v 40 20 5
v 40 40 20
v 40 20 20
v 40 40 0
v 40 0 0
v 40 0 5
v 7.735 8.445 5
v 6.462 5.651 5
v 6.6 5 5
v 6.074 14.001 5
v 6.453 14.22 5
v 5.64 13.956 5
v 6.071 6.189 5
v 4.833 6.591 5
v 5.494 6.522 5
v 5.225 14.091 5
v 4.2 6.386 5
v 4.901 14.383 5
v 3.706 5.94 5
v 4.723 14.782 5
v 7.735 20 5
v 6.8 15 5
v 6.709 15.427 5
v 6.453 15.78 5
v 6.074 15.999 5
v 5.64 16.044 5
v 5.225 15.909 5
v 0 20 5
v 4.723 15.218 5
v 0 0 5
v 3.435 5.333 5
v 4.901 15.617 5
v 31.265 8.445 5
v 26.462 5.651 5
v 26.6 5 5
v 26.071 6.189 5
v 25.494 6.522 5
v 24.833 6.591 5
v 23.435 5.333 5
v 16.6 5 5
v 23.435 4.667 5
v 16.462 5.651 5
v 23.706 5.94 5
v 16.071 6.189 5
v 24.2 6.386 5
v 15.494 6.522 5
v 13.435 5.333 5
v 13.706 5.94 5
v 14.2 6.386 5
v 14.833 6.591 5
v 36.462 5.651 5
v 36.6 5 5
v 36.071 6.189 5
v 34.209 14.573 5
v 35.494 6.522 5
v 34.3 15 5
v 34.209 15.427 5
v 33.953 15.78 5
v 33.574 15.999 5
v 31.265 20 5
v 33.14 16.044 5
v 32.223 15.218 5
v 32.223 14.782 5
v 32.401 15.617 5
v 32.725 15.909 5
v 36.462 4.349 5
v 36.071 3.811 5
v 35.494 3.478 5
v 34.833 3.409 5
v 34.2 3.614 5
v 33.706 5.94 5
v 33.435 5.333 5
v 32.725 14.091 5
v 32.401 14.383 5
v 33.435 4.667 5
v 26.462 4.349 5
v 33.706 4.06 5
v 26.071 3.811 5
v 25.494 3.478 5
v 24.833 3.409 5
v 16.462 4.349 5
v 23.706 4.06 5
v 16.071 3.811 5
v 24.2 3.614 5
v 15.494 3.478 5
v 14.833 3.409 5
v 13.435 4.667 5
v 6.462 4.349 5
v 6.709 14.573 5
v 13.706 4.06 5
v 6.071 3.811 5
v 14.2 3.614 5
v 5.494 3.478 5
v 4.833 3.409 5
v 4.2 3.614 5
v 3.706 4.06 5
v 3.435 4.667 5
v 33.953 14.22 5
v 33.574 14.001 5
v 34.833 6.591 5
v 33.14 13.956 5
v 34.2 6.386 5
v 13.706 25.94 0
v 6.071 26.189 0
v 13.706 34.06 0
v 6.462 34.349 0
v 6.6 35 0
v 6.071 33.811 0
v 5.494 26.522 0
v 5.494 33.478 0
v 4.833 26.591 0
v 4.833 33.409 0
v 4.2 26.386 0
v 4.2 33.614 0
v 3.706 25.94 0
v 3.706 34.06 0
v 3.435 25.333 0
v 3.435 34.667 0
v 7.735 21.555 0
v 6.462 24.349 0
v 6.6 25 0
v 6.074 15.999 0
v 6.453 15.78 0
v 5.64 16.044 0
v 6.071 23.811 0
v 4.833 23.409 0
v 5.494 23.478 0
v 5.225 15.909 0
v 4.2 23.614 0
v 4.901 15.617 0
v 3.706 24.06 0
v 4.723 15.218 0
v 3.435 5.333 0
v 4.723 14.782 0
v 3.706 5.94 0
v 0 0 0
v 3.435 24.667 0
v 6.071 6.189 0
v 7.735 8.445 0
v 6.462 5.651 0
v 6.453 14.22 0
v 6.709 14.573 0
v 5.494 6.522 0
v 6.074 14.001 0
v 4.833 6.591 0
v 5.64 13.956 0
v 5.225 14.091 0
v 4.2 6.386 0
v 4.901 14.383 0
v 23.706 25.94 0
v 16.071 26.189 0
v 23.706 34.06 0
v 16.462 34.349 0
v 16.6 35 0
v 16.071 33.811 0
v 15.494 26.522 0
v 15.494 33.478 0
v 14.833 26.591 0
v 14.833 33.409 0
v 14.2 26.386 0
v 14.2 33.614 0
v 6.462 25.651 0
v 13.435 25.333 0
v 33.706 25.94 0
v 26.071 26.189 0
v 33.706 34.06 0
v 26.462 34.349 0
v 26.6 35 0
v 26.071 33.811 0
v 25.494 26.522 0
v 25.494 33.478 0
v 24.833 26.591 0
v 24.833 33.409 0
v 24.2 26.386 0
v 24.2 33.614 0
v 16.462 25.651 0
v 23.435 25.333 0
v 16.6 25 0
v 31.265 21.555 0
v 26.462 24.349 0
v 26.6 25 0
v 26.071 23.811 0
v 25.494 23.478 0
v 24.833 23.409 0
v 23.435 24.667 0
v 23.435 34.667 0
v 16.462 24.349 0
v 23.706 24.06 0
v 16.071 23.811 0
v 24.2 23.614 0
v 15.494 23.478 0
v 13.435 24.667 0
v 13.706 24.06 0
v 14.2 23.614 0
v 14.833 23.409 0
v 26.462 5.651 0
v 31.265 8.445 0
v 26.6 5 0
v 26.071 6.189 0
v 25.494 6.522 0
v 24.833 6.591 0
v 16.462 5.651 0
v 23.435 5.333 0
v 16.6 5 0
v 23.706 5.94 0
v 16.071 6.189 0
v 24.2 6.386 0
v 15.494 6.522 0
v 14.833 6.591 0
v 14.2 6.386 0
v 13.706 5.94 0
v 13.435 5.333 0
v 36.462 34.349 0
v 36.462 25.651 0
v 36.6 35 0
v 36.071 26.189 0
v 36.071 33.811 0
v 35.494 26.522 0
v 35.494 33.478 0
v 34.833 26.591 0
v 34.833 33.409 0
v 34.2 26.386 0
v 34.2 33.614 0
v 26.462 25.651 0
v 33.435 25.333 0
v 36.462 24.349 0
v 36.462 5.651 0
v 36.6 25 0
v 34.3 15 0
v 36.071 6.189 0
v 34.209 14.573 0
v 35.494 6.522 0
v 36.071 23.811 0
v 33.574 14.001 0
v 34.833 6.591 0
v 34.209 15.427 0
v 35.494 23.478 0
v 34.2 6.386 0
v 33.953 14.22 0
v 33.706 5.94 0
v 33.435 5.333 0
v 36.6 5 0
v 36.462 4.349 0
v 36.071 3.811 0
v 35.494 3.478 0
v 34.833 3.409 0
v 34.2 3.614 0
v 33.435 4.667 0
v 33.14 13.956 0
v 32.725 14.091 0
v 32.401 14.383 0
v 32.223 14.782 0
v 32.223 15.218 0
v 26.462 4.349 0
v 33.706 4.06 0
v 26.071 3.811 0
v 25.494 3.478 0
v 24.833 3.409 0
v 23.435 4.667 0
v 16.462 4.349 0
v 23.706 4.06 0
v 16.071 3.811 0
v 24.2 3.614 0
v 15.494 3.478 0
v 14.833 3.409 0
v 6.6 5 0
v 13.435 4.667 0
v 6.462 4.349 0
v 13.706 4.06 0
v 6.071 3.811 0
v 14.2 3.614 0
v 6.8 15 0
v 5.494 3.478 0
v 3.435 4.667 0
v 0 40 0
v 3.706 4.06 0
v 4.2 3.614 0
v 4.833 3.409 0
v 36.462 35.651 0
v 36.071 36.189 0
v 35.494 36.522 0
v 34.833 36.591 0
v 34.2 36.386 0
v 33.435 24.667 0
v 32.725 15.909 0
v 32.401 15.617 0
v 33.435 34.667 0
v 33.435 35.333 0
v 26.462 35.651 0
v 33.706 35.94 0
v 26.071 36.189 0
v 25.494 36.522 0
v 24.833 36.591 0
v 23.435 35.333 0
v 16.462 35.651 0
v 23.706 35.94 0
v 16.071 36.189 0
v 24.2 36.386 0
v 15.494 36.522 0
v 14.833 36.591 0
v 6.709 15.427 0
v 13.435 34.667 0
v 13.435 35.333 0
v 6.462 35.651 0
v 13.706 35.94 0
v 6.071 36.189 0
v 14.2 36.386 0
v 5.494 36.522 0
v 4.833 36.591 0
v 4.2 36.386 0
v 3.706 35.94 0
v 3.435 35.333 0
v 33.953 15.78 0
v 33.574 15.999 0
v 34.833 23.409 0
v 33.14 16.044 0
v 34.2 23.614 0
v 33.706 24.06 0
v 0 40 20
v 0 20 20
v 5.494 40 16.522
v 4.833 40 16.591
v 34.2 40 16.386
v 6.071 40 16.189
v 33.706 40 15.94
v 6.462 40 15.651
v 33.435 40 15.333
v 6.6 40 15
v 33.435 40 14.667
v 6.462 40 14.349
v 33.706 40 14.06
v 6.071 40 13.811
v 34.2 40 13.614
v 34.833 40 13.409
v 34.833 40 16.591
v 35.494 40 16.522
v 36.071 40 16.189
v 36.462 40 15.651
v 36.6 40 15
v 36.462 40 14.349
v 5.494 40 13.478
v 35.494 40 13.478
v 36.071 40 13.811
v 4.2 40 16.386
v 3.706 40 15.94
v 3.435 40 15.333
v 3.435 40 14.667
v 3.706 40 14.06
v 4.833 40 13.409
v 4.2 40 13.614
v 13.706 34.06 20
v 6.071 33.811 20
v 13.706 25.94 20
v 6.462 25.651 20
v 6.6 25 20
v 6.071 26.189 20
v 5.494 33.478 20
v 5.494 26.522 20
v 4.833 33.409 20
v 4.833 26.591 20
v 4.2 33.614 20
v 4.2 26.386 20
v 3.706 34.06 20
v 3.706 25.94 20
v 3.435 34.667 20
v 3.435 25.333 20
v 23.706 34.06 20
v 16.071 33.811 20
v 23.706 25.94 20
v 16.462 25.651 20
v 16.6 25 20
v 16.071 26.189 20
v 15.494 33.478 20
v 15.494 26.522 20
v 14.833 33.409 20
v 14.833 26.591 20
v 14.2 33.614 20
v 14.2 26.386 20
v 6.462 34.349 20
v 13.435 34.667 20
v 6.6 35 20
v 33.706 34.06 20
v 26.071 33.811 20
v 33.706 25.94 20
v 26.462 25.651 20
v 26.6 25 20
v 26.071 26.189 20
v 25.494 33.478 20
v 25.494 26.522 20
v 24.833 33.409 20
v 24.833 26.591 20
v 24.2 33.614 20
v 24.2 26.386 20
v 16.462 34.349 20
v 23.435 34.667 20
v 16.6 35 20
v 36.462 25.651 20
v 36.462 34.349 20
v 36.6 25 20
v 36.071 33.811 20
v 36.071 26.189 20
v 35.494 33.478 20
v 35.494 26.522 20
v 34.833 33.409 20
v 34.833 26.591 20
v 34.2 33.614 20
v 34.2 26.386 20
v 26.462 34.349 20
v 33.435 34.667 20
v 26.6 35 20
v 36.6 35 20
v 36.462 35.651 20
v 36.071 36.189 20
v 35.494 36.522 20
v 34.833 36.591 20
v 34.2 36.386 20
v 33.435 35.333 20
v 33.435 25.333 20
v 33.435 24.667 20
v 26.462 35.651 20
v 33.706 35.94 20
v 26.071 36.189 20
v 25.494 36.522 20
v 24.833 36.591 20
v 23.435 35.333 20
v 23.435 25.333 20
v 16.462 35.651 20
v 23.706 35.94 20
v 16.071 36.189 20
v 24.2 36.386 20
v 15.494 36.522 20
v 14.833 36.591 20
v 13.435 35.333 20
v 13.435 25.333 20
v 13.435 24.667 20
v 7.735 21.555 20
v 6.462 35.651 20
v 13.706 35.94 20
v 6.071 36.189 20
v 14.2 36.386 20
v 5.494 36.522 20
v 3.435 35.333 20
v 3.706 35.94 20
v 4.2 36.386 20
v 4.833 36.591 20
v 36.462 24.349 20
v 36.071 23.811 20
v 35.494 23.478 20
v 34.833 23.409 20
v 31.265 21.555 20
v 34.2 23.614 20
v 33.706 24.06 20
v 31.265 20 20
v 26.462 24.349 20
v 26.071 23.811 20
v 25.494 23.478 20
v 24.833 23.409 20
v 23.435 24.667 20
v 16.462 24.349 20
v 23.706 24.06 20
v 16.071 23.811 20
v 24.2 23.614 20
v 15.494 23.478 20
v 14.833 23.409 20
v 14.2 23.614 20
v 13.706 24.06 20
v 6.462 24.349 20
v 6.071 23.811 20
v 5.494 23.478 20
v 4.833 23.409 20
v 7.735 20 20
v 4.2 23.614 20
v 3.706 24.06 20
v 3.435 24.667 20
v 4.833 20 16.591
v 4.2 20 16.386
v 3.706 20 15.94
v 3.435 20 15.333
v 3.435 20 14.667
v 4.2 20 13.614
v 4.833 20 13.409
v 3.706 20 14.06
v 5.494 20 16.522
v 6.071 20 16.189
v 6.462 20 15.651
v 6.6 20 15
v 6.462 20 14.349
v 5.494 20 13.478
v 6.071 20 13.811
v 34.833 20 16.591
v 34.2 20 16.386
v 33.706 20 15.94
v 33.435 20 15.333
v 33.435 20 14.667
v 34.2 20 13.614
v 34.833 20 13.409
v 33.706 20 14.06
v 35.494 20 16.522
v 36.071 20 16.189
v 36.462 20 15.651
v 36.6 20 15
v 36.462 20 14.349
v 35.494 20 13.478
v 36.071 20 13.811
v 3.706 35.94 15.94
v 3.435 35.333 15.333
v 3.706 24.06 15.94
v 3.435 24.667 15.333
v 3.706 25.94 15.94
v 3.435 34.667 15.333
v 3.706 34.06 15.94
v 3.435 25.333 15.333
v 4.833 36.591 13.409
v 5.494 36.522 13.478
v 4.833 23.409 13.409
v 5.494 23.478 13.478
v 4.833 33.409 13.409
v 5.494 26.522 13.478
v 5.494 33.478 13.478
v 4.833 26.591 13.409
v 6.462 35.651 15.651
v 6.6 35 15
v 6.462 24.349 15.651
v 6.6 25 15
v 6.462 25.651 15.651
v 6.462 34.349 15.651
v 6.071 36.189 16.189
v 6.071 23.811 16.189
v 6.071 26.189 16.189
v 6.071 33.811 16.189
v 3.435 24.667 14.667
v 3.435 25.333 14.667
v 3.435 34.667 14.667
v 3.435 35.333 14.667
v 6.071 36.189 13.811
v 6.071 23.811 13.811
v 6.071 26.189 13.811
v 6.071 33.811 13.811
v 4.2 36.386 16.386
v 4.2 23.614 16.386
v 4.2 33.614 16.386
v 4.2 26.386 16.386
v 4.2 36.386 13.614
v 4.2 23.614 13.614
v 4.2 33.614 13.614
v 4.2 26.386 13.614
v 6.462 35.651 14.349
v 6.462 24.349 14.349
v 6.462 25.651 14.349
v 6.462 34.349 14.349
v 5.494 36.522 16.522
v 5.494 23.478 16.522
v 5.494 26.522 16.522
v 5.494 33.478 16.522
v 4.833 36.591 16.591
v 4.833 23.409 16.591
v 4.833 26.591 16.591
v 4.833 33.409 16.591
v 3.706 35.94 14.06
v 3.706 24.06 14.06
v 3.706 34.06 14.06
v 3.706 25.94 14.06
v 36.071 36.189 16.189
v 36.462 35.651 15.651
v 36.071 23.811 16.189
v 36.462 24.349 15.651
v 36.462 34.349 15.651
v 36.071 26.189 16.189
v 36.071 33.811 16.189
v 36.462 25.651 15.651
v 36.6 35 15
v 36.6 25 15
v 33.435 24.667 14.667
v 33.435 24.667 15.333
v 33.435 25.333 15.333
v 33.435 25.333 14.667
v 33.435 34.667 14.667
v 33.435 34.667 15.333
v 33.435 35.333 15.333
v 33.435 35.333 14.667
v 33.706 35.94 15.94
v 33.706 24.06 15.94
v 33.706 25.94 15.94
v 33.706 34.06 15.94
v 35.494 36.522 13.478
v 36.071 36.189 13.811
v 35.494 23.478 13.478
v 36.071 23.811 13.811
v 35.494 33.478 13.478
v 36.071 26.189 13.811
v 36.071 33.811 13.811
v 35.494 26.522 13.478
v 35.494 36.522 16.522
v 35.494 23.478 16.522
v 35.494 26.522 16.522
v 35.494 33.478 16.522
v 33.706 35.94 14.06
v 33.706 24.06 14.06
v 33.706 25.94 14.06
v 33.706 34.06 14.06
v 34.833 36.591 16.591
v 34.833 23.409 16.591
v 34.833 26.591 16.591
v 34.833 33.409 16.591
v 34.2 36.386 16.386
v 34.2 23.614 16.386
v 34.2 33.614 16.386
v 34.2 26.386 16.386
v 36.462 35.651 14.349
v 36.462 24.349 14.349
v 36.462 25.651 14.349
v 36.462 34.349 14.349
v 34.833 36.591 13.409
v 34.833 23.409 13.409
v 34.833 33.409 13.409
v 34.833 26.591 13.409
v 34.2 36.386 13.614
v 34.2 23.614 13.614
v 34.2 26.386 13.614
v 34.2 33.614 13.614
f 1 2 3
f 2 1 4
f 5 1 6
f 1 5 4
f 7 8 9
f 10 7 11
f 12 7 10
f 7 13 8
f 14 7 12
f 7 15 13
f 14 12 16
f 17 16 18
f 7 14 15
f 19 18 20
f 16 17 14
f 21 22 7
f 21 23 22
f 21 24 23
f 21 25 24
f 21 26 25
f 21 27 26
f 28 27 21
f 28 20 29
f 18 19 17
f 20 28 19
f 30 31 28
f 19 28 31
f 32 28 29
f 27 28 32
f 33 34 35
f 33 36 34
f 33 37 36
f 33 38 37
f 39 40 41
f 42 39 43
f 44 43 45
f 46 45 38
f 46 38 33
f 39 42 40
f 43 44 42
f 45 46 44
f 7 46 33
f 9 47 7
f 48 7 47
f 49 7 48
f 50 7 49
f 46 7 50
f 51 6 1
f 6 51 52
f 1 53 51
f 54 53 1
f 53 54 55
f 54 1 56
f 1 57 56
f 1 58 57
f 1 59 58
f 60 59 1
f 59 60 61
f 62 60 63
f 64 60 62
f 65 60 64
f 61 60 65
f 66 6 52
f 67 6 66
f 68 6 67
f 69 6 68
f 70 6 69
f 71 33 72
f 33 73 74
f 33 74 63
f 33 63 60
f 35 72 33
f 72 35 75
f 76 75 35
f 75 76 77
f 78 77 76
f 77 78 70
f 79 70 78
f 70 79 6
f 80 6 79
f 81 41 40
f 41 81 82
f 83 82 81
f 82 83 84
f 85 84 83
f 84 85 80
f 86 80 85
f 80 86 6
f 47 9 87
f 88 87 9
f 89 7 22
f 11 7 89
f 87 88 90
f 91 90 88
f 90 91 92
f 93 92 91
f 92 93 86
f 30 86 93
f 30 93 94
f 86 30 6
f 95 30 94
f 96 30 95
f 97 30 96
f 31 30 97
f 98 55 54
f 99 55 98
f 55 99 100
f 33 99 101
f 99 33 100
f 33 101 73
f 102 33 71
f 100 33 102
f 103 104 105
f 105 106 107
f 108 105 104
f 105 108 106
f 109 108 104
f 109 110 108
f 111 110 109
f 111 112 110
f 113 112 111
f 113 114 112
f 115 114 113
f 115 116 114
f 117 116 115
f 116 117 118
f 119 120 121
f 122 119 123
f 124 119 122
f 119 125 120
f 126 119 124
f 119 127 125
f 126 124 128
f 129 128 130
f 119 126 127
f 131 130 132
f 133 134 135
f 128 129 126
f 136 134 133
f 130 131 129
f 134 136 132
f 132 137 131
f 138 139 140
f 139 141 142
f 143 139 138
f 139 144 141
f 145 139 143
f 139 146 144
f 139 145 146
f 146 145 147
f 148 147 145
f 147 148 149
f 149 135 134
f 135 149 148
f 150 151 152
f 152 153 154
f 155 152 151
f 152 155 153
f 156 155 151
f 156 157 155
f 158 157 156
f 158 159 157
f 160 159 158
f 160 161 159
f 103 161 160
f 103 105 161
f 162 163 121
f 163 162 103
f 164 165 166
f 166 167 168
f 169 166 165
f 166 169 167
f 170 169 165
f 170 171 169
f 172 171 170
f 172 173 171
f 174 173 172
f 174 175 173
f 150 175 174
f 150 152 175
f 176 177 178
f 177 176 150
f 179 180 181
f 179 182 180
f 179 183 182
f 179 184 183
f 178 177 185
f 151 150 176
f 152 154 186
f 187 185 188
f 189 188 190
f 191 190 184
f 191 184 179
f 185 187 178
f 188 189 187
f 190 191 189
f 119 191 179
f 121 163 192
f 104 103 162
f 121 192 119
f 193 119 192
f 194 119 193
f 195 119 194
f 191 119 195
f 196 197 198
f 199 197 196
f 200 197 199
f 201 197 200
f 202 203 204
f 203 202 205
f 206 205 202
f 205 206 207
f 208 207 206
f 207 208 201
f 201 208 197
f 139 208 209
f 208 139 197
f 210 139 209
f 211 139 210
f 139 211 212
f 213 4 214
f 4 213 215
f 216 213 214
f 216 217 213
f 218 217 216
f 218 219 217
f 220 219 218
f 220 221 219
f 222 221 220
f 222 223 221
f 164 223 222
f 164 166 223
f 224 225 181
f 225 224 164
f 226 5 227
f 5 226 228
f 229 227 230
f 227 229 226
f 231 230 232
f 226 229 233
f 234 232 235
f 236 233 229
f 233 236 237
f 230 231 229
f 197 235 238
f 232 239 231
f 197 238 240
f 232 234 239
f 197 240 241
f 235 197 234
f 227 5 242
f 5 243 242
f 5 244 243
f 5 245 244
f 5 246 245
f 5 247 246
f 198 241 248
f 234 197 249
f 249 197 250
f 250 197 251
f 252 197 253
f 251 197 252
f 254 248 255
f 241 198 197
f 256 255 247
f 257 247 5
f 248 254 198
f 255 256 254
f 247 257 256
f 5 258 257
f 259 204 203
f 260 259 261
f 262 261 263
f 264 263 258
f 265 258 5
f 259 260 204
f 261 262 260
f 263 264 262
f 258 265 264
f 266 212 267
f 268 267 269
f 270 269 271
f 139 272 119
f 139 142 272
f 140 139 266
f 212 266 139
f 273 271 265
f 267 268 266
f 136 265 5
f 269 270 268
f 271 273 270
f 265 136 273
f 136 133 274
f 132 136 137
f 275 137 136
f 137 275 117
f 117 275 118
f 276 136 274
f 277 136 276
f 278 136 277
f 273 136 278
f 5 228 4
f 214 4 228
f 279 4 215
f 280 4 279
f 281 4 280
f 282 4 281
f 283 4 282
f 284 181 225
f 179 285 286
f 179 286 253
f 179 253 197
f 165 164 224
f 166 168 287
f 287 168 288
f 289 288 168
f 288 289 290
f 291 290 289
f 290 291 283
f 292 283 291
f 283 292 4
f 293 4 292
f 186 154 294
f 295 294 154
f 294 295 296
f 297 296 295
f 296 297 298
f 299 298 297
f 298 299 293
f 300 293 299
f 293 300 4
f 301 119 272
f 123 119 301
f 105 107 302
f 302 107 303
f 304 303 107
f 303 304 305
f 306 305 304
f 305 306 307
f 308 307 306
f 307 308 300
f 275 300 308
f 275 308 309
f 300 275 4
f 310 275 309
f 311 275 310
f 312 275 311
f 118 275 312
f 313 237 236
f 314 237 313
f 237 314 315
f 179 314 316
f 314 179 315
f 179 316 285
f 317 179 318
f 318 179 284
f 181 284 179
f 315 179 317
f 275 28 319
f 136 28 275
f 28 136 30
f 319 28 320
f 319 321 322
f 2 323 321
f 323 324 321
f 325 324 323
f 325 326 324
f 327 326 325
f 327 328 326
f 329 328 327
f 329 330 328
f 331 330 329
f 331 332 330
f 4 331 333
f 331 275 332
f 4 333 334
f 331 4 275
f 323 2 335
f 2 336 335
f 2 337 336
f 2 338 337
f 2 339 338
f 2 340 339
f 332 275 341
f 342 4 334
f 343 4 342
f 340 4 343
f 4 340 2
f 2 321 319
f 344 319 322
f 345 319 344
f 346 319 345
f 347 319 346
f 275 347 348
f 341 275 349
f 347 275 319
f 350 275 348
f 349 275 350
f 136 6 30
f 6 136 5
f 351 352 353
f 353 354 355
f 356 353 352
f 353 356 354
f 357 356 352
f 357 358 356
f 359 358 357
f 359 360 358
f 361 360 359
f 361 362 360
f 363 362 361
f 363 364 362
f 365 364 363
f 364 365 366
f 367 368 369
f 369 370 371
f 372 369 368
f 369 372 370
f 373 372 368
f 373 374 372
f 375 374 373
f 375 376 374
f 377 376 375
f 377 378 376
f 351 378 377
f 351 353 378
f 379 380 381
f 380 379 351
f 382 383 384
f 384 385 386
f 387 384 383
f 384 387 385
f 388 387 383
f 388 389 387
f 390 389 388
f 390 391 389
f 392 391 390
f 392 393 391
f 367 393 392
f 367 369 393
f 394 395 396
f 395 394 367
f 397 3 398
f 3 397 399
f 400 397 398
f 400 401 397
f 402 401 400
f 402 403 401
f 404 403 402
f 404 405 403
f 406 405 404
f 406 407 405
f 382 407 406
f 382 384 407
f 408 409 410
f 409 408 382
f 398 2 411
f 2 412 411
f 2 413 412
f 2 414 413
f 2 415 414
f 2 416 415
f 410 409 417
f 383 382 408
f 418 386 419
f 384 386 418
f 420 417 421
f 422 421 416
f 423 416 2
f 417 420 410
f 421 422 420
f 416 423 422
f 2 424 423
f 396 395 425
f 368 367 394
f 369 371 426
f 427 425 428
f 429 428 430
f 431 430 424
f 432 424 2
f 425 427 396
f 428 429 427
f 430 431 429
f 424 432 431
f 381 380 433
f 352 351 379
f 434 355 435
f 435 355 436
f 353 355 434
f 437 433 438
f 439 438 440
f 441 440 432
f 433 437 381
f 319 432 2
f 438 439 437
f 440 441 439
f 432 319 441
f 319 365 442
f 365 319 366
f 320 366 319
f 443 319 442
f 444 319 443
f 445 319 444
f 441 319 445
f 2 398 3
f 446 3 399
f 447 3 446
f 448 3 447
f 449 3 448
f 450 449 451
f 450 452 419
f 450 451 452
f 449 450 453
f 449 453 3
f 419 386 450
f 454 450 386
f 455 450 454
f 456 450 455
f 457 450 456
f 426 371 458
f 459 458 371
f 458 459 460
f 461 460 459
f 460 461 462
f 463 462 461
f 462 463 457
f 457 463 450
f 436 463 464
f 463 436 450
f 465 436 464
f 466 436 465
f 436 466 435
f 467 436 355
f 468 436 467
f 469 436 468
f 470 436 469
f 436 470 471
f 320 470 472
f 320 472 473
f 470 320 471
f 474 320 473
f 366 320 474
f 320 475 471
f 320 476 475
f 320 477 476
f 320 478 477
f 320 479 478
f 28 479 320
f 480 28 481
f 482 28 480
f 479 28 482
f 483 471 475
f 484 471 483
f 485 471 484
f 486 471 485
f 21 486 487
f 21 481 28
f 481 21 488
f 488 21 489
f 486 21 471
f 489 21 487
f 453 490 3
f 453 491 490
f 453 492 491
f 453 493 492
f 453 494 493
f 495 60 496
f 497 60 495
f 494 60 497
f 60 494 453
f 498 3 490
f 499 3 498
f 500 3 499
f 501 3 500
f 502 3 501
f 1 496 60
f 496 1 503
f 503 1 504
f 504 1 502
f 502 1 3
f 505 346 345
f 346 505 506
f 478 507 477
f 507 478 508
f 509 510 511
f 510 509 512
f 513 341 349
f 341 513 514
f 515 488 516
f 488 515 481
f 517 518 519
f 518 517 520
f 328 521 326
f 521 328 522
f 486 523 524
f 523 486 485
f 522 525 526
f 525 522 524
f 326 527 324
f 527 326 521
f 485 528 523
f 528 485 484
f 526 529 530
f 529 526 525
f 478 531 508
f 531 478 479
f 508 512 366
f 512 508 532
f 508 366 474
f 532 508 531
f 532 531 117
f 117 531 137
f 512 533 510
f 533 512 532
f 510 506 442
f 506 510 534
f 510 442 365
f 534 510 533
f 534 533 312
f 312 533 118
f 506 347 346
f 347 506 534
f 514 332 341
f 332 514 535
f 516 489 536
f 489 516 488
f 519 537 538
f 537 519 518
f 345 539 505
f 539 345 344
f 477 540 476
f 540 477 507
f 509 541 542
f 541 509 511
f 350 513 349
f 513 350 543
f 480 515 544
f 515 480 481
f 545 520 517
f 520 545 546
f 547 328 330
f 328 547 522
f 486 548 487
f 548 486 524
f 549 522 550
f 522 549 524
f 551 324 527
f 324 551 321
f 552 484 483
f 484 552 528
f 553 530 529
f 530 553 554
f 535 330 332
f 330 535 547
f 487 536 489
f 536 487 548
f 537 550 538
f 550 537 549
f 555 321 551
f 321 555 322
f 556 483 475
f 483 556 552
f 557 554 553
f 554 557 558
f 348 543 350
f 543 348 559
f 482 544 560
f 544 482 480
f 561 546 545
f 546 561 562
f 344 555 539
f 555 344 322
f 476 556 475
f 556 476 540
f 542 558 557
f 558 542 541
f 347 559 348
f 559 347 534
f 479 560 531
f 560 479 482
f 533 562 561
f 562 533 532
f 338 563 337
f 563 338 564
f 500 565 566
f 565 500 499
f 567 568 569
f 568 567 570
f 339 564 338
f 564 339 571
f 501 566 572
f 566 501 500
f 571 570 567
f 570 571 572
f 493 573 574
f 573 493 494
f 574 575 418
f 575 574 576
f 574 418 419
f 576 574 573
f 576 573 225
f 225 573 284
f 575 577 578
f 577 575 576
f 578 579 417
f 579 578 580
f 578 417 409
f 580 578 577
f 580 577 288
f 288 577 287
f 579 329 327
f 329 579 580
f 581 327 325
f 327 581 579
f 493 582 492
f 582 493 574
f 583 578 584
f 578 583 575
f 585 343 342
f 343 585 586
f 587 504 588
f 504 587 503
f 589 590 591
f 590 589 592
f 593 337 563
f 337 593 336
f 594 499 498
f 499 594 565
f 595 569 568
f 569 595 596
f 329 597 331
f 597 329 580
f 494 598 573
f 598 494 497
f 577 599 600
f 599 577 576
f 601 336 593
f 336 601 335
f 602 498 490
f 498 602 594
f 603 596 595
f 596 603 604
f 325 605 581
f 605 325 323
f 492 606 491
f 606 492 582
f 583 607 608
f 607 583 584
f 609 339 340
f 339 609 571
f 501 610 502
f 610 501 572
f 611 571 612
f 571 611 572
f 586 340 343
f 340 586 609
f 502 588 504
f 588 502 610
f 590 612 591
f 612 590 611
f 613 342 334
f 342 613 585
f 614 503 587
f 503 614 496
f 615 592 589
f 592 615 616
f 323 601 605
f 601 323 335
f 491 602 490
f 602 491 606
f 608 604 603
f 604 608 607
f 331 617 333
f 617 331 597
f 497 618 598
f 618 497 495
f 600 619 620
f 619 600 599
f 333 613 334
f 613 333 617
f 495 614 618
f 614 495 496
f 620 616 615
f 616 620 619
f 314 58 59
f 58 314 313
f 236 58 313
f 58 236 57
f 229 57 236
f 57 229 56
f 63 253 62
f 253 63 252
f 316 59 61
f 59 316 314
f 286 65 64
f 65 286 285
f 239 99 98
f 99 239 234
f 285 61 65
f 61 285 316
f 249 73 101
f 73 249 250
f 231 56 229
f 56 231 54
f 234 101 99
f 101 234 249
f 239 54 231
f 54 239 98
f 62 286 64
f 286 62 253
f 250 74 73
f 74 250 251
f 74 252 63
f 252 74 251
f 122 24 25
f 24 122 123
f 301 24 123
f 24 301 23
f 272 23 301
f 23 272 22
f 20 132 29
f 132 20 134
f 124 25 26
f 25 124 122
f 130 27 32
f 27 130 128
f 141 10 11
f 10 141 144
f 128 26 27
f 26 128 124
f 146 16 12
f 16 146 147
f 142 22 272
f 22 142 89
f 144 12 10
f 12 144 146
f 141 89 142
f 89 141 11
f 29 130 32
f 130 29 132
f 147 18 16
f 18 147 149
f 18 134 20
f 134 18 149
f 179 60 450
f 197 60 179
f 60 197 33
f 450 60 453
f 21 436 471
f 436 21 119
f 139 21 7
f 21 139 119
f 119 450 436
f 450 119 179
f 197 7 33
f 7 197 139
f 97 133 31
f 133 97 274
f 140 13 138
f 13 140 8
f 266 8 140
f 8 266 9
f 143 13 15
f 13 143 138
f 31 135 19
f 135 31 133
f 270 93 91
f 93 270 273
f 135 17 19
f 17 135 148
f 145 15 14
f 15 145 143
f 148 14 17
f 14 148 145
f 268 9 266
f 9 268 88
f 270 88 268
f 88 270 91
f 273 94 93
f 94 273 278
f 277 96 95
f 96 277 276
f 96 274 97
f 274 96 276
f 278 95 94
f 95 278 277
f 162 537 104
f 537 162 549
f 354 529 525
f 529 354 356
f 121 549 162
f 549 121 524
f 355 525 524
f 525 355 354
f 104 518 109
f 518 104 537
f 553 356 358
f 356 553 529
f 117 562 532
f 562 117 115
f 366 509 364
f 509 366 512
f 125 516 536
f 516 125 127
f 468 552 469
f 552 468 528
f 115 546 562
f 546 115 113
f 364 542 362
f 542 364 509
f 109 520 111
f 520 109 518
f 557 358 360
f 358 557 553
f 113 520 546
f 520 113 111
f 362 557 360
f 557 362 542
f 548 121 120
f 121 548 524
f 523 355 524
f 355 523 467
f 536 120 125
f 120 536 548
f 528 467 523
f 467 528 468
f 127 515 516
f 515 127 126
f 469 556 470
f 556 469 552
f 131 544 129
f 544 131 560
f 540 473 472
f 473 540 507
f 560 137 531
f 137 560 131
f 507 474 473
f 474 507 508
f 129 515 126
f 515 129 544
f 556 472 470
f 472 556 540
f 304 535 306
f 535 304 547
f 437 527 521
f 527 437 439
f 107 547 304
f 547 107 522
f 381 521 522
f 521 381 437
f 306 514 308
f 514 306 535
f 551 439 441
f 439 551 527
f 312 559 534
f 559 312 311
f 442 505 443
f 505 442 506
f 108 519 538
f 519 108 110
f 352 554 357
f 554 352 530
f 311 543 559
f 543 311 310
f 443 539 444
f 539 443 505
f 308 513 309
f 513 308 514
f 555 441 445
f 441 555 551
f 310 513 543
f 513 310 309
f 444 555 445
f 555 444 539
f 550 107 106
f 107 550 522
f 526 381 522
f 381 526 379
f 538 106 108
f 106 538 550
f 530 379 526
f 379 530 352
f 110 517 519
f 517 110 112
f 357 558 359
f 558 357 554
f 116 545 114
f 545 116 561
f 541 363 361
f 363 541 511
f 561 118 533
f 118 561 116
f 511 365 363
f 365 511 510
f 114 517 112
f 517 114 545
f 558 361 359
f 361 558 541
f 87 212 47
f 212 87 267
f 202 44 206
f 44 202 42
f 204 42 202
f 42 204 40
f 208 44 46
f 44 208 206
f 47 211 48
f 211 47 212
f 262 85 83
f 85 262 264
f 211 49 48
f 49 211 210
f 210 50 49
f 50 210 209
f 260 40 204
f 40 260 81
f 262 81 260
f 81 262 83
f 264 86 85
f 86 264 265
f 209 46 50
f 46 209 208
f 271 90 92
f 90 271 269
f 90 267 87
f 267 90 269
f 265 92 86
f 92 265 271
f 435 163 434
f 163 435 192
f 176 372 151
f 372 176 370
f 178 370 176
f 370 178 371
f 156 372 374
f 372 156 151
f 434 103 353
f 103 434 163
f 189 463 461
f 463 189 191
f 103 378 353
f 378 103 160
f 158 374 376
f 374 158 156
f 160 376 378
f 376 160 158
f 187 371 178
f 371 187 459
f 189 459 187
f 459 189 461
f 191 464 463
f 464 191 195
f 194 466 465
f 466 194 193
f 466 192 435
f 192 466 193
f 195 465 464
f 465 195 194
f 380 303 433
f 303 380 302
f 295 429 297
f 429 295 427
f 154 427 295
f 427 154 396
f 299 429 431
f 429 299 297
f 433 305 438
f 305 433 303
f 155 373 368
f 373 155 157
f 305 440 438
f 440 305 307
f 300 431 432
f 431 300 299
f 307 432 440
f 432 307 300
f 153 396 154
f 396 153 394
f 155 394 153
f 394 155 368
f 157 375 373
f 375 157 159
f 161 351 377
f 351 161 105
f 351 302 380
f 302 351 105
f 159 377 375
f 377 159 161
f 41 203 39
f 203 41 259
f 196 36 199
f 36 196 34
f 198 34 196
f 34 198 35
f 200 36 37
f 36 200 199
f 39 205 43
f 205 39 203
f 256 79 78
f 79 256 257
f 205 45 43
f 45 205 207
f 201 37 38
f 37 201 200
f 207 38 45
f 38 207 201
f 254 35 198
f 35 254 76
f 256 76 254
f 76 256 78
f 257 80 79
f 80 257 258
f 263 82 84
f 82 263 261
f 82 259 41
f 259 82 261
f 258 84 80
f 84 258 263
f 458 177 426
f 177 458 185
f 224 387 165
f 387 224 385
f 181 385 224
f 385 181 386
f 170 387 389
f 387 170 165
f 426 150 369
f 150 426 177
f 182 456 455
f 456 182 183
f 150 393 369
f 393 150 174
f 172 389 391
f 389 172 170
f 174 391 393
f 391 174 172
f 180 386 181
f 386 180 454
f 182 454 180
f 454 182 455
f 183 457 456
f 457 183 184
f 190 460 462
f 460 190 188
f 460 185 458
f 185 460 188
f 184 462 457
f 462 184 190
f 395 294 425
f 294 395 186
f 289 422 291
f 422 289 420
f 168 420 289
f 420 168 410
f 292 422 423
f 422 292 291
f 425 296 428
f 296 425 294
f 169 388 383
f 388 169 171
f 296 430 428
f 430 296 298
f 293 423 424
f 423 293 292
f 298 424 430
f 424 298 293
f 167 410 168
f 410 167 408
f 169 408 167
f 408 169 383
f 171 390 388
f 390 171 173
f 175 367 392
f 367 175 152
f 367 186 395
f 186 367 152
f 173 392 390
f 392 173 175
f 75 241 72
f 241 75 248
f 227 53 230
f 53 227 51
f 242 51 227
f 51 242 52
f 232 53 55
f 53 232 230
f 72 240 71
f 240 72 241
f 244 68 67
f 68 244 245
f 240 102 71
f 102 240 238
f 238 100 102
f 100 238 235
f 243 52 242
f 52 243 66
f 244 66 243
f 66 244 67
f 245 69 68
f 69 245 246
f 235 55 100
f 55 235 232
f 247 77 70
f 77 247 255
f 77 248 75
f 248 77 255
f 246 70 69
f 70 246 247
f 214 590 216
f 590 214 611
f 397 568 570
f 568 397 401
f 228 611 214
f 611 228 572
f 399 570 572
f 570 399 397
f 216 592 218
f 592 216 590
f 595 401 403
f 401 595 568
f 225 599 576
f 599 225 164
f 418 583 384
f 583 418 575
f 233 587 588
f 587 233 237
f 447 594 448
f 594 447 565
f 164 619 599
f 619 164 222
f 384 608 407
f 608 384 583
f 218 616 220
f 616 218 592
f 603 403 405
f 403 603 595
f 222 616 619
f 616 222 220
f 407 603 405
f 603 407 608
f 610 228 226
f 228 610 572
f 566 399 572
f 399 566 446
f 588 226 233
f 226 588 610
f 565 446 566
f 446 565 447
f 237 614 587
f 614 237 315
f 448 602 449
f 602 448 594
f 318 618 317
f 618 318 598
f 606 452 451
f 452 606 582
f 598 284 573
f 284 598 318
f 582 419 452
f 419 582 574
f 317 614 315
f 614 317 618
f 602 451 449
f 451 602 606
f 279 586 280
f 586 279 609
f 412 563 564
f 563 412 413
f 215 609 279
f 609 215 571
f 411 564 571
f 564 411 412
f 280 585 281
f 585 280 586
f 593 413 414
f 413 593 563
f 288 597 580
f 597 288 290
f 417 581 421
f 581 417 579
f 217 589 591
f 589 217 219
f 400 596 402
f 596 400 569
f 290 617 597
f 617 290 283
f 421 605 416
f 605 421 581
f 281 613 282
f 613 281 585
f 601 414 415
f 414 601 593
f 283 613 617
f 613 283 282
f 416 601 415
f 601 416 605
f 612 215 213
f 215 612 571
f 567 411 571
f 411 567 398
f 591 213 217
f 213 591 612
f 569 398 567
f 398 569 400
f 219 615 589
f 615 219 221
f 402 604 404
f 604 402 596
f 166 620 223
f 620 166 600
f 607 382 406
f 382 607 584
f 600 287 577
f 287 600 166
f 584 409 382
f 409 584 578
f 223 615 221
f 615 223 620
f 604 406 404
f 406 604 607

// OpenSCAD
$fn=15;

PLATE_THICKNESS = 5;

SCREW_SPACING = 27.5; //center-to-center dist. between servo mounting holes.

AXLE_POSITION = 8.25; //distance from servo output axis to center of nearest
                      //mounting hole. Aligned to part grid.
                      
SERVO_BOXWIDTH = 12.11;
SERVO_BOXLENGTH = 22.53;

cutout_width = SERVO_BOXWIDTH + 1;
cutout_length = SERVO_BOXLENGTH + 1;
MOUNTHOLE_D = 2.1;

GRIDHOLE_D = 3.2;

N = 4;
M = 4;

P = 3;
Q = 2;

AXLE_X_POS = (P*10)-5;
AXLE_Y_POS = (Q*10)-5;

/*
translate([AXLE_X_POS,AXLE_Y_POS,0]){
        color("red")
        cylinder(h=100,d=2,center=true);
}
*/
difference(){
    
    union(){
        cube([N*10,M*10,PLATE_THICKNESS]);
        translate([0,20,0])cube([40,20,20]);
    }
    for(i=[0:1]){
        translate([5+i*10*(N-1),0,15])
        rotate(90,[1,0,0])
        cylinder(h=200,d=GRIDHOLE_D,center=true);
    }
    translate([AXLE_X_POS,AXLE_Y_POS,0]){
        
        translate([AXLE_POSITION,0,0]){
            cylinder(d=MOUNTHOLE_D, h=100, center=true);
        }
        translate([AXLE_POSITION - SCREW_SPACING,0,0]){
            cylinder(d=MOUNTHOLE_D, h=100, center=true);
        }
        translate([AXLE_POSITION - (SCREW_SPACING/2),0,0]){
            cube([cutout_length,cutout_width,100], center=true);
        }
    }
    for(i = [0:N-1]){
        for(j = [0:M-1]){
            if(!(((i==((AXLE_X_POS-5)/10)-2)&&(j==(AXLE_Y_POS-5)/10))||((i==((AXLE_X_POS-5)/10)+1)&&(j==(AXLE_Y_POS-5)/10)))){
                translate([5+i*10,5+j*10,0]){
                    cylinder(d=GRIDHOLE_D,h=100,center=true);
                }
            }
        }
    }
}
